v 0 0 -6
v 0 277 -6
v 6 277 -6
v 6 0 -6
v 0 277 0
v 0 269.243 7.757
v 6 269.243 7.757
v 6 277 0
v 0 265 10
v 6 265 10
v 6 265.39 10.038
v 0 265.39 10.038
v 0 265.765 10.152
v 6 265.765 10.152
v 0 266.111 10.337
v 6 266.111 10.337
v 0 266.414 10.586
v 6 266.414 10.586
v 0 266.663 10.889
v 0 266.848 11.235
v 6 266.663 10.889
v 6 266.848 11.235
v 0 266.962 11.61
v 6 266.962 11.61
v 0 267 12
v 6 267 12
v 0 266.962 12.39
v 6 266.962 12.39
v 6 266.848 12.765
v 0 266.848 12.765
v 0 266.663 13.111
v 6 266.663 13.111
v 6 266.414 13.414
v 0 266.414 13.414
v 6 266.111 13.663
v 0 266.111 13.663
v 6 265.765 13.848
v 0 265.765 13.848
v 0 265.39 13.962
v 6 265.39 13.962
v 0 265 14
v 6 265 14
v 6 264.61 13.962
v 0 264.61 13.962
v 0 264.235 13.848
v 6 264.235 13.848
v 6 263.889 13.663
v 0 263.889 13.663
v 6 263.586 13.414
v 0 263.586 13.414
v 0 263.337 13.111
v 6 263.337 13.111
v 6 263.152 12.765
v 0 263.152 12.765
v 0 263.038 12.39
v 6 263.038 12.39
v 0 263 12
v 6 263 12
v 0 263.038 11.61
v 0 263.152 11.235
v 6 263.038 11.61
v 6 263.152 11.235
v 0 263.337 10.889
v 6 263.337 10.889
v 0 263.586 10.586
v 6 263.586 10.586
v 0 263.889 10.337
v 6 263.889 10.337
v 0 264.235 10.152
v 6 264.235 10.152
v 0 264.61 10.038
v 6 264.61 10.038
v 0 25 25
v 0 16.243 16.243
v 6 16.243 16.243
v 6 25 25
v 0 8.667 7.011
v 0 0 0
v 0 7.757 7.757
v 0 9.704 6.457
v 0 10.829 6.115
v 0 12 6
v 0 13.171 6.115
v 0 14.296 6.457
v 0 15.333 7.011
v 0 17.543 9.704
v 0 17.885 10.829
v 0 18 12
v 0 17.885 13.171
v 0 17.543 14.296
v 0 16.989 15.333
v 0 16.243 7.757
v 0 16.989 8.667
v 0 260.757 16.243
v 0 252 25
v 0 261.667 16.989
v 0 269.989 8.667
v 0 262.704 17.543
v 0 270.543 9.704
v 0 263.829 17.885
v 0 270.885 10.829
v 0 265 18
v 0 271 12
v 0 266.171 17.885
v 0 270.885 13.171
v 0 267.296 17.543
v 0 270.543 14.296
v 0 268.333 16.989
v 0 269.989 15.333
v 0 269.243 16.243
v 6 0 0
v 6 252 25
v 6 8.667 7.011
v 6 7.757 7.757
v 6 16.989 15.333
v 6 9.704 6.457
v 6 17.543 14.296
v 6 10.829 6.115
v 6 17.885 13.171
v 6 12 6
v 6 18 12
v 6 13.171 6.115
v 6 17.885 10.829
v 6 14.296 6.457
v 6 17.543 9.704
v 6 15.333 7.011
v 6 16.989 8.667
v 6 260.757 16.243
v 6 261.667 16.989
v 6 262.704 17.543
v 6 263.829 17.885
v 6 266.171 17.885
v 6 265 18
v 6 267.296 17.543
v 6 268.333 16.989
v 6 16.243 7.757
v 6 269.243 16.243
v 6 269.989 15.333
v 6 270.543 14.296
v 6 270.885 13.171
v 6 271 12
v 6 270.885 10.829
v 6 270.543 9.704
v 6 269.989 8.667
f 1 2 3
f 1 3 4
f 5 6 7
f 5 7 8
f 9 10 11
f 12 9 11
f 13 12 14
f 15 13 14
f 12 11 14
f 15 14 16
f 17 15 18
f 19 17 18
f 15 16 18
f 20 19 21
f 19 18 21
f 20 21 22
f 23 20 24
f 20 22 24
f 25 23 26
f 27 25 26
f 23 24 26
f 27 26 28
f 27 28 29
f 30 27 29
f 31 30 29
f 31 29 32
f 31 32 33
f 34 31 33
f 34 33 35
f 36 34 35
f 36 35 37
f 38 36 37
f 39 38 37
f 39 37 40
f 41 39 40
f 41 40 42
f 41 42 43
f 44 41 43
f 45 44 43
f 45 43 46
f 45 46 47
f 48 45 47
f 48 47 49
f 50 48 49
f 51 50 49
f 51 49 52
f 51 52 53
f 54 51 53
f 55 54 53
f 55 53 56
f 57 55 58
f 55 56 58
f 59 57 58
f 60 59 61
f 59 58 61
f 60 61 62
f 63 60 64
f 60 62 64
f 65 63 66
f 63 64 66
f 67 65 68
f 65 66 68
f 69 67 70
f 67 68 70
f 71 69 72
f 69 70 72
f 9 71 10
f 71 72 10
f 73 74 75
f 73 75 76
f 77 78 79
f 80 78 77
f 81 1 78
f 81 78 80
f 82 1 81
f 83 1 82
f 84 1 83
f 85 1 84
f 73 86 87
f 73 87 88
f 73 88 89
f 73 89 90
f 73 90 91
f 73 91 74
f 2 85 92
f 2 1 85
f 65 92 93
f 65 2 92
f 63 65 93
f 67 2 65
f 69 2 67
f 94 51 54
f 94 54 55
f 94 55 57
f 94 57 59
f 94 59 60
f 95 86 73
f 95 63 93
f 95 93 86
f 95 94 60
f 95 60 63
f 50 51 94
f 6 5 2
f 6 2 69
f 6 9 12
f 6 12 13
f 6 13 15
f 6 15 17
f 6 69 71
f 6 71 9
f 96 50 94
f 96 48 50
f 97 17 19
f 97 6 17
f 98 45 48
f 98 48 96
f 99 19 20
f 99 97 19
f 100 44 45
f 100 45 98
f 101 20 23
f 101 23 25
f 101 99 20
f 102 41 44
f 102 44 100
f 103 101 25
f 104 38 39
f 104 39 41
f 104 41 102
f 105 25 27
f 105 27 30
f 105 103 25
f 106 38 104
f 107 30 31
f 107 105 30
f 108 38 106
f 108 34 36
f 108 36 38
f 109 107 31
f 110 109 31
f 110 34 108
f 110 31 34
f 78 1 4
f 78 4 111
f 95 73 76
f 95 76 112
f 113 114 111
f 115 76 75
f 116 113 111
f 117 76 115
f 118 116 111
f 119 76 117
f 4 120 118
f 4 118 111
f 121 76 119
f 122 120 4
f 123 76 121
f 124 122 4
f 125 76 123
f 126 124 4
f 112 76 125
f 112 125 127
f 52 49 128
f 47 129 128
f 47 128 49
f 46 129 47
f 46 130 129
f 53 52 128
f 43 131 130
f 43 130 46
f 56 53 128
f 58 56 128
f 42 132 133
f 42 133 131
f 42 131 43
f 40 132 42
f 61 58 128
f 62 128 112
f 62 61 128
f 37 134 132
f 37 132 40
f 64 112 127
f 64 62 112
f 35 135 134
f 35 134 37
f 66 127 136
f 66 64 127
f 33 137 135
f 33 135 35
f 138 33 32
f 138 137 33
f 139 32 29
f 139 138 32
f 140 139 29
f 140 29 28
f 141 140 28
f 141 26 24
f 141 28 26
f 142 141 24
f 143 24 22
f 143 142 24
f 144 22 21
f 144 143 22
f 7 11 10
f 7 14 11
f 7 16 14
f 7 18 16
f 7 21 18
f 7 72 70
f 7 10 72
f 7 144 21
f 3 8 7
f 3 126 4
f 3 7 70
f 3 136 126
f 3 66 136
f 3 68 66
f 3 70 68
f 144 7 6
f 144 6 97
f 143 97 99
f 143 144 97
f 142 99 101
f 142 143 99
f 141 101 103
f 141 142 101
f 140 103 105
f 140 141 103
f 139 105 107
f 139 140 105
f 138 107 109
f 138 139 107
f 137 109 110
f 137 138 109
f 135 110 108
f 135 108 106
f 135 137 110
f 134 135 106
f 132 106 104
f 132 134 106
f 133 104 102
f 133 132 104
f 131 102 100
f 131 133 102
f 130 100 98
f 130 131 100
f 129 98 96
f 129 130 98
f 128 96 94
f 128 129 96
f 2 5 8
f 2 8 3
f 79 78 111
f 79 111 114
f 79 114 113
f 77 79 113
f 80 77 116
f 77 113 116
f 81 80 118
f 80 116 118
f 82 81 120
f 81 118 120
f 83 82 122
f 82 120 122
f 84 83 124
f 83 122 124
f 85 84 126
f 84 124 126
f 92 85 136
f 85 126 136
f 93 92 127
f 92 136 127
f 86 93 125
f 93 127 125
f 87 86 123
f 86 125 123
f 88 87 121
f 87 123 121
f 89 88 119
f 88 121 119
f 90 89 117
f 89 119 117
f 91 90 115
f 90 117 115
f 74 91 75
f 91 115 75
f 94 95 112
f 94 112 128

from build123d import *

# Parameters (mm, degrees)
BOSS_EXTRUDE1_DEPTH = 6
SKETCH4_R           = 6
BOSS_EXTRUDE2_DEPTH = 6
SKETCH3_R           = 2
SKETCH3_R_2         = 6
CUT_EXTRUDE1_DEPTH  = 279.190582155


with BuildPart() as part:
    # Sketch2 → Boss-Extrude1 (new body)
    with BuildSketch(Plane(origin=(0, 0, 0), x_dir=(0, 0, -1), z_dir=(1, 0, 0))):
        Polygon((0, 277), (6, 277), (6, 0), (0, 0), (-25, 25), (-25, 252), align=None)
    extrude(amount=BOSS_EXTRUDE1_DEPTH)

    # Sketch4 → Boss-Extrude2 (add)
    with BuildSketch(Plane(origin=(6, 0, 0), x_dir=(0, 0, -1), z_dir=(1, 0, 0))):
        with Locations((-12, 265)):
            Circle(SKETCH4_R)
    extrude(amount=-BOSS_EXTRUDE2_DEPTH)

    # Sketch3 → Cut-Extrude1 (cut, through all)
    with BuildSketch(Plane(origin=(6, 0, 0), x_dir=(0, 0, -1), z_dir=(1, 0, 0))):
        with Locations((-12, 265)):
            Circle(SKETCH3_R)
        with Locations((-12, 12)):
            Circle(SKETCH3_R_2)
    extrude(amount=-CUT_EXTRUDE1_DEPTH, mode=Mode.SUBTRACT)


solid = part.part
